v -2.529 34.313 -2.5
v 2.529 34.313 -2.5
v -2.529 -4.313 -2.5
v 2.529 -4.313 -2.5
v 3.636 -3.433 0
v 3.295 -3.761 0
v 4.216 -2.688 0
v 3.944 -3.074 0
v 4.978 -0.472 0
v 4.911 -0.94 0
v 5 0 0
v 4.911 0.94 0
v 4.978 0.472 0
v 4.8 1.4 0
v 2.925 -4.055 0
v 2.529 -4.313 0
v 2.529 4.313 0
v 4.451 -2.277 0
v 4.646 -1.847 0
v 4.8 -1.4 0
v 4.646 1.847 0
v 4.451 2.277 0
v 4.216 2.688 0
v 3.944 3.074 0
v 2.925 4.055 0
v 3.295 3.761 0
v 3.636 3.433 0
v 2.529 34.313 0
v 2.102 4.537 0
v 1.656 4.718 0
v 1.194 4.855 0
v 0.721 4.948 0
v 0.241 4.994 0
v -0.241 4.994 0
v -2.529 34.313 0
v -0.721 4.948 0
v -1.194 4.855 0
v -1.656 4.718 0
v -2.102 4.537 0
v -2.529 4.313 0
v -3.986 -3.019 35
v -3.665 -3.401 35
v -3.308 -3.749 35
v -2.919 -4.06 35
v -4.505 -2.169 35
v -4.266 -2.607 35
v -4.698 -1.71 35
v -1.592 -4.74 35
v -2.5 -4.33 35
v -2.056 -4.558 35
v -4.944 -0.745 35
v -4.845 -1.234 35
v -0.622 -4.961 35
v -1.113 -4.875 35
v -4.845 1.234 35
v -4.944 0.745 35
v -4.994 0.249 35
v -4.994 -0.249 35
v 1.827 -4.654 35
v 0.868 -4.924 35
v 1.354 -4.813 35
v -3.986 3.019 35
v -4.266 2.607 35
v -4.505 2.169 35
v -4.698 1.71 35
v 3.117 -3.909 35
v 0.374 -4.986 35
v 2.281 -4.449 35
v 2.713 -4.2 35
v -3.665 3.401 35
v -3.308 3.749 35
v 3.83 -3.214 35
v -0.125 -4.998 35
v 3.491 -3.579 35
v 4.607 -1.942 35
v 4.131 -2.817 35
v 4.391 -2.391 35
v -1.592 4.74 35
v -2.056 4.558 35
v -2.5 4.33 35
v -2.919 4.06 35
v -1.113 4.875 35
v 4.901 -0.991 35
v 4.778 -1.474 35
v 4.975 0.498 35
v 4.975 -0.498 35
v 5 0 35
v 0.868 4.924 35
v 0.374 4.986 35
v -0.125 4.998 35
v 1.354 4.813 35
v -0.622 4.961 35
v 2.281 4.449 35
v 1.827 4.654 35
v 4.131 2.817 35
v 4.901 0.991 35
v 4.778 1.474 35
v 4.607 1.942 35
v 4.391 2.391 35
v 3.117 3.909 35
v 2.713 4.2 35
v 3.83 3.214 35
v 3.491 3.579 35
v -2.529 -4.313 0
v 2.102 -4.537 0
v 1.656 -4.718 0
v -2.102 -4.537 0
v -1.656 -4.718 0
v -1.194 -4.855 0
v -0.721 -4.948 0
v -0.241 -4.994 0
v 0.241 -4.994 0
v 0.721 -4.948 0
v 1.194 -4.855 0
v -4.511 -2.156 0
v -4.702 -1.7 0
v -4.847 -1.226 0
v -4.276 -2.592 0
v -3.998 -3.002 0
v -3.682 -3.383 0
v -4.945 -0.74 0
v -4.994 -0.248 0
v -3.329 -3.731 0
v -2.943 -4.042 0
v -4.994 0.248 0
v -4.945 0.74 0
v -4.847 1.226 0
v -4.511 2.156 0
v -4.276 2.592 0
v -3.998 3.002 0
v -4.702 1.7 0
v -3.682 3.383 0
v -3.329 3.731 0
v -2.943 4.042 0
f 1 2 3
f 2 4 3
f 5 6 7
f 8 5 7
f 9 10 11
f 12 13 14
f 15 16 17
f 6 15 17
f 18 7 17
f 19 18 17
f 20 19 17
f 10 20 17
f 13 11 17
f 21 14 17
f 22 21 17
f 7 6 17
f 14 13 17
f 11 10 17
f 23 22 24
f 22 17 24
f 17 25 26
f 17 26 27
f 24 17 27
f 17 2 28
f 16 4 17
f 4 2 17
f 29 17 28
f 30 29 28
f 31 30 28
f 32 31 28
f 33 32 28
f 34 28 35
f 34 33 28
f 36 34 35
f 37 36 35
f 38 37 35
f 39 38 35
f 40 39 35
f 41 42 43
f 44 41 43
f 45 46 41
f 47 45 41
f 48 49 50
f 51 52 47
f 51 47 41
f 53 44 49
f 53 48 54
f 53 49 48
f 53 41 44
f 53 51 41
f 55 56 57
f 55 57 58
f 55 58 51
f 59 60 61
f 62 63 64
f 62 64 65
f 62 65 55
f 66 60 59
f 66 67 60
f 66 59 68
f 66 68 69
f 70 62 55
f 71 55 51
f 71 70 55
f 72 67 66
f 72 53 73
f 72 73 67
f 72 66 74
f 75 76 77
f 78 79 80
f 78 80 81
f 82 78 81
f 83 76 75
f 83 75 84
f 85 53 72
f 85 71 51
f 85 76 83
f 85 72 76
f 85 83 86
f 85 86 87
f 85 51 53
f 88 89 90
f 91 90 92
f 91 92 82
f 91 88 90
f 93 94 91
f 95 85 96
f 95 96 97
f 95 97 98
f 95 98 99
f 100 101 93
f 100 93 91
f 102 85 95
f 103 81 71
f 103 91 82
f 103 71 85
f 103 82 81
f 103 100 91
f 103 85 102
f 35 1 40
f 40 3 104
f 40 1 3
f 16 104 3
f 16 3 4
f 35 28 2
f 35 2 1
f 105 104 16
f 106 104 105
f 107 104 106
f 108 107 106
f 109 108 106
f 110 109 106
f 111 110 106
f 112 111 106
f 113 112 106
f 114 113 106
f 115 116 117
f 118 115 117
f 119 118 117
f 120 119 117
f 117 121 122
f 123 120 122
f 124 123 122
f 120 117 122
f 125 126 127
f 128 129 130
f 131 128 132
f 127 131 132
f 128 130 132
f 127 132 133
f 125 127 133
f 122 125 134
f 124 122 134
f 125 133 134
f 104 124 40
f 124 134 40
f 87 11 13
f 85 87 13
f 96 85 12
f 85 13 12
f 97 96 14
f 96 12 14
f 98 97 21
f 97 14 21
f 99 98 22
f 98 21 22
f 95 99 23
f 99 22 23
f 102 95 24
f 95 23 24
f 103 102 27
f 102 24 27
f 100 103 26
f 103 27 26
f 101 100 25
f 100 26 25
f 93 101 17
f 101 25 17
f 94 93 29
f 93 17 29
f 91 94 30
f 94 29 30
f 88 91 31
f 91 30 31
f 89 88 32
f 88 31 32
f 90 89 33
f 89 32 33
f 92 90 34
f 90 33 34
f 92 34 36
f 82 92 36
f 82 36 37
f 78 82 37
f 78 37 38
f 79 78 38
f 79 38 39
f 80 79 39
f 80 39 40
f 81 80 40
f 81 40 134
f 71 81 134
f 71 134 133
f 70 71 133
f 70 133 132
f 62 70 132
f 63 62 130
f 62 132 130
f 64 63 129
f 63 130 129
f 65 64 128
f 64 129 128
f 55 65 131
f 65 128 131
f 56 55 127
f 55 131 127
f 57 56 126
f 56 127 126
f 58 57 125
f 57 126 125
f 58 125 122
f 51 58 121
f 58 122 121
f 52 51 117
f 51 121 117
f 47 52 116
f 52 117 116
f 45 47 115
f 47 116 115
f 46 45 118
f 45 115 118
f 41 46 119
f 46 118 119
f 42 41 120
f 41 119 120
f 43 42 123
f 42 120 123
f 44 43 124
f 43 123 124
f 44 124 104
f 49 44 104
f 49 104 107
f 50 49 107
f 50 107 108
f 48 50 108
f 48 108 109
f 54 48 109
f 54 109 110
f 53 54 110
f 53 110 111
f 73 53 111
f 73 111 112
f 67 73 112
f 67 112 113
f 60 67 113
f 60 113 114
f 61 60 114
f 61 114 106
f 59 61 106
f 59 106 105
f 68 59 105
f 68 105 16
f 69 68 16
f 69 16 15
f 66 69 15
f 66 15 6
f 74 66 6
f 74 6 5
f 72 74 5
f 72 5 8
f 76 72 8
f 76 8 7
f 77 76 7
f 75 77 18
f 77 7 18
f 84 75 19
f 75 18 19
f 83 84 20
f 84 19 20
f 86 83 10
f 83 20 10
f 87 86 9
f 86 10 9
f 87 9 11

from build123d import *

# Parameters (mm, degrees)
F0_R      = 5
F1_DEPTH  = 35
F2_W      = 5.05839
F2_H      = 18.62628
F3_DEPTH  = 2.5
F3_FACE_W = 5.05839
F3_FACE_H = 2.5
F4_DEPTH  = 20


with BuildPart() as f1:
    # F0 (on Top) → F1 (new body)
    with BuildSketch(Plane.XY):
        Circle(F0_R)
    extrude(amount=F1_DEPTH)

    # F2 (on face) → F3 (join)
    with BuildSketch(Plane(origin=(0, 0, 0), x_dir=(1, 0, 0), z_dir=(0, 0, -1))):
        with Locations((0, -5)):
            Rectangle(F2_W, F2_H)
    extrude(amount=F3_DEPTH)

    # F3_face (on face) → F4 (join)
    with BuildSketch(Plane(origin=(0, 14.31314, -1.25), x_dir=(-1, 0, 0), z_dir=(0, 1, 0))):
        Rectangle(F3_FACE_W, F3_FACE_H)
    extrude(amount=F4_DEPTH)


solid = f1.part
